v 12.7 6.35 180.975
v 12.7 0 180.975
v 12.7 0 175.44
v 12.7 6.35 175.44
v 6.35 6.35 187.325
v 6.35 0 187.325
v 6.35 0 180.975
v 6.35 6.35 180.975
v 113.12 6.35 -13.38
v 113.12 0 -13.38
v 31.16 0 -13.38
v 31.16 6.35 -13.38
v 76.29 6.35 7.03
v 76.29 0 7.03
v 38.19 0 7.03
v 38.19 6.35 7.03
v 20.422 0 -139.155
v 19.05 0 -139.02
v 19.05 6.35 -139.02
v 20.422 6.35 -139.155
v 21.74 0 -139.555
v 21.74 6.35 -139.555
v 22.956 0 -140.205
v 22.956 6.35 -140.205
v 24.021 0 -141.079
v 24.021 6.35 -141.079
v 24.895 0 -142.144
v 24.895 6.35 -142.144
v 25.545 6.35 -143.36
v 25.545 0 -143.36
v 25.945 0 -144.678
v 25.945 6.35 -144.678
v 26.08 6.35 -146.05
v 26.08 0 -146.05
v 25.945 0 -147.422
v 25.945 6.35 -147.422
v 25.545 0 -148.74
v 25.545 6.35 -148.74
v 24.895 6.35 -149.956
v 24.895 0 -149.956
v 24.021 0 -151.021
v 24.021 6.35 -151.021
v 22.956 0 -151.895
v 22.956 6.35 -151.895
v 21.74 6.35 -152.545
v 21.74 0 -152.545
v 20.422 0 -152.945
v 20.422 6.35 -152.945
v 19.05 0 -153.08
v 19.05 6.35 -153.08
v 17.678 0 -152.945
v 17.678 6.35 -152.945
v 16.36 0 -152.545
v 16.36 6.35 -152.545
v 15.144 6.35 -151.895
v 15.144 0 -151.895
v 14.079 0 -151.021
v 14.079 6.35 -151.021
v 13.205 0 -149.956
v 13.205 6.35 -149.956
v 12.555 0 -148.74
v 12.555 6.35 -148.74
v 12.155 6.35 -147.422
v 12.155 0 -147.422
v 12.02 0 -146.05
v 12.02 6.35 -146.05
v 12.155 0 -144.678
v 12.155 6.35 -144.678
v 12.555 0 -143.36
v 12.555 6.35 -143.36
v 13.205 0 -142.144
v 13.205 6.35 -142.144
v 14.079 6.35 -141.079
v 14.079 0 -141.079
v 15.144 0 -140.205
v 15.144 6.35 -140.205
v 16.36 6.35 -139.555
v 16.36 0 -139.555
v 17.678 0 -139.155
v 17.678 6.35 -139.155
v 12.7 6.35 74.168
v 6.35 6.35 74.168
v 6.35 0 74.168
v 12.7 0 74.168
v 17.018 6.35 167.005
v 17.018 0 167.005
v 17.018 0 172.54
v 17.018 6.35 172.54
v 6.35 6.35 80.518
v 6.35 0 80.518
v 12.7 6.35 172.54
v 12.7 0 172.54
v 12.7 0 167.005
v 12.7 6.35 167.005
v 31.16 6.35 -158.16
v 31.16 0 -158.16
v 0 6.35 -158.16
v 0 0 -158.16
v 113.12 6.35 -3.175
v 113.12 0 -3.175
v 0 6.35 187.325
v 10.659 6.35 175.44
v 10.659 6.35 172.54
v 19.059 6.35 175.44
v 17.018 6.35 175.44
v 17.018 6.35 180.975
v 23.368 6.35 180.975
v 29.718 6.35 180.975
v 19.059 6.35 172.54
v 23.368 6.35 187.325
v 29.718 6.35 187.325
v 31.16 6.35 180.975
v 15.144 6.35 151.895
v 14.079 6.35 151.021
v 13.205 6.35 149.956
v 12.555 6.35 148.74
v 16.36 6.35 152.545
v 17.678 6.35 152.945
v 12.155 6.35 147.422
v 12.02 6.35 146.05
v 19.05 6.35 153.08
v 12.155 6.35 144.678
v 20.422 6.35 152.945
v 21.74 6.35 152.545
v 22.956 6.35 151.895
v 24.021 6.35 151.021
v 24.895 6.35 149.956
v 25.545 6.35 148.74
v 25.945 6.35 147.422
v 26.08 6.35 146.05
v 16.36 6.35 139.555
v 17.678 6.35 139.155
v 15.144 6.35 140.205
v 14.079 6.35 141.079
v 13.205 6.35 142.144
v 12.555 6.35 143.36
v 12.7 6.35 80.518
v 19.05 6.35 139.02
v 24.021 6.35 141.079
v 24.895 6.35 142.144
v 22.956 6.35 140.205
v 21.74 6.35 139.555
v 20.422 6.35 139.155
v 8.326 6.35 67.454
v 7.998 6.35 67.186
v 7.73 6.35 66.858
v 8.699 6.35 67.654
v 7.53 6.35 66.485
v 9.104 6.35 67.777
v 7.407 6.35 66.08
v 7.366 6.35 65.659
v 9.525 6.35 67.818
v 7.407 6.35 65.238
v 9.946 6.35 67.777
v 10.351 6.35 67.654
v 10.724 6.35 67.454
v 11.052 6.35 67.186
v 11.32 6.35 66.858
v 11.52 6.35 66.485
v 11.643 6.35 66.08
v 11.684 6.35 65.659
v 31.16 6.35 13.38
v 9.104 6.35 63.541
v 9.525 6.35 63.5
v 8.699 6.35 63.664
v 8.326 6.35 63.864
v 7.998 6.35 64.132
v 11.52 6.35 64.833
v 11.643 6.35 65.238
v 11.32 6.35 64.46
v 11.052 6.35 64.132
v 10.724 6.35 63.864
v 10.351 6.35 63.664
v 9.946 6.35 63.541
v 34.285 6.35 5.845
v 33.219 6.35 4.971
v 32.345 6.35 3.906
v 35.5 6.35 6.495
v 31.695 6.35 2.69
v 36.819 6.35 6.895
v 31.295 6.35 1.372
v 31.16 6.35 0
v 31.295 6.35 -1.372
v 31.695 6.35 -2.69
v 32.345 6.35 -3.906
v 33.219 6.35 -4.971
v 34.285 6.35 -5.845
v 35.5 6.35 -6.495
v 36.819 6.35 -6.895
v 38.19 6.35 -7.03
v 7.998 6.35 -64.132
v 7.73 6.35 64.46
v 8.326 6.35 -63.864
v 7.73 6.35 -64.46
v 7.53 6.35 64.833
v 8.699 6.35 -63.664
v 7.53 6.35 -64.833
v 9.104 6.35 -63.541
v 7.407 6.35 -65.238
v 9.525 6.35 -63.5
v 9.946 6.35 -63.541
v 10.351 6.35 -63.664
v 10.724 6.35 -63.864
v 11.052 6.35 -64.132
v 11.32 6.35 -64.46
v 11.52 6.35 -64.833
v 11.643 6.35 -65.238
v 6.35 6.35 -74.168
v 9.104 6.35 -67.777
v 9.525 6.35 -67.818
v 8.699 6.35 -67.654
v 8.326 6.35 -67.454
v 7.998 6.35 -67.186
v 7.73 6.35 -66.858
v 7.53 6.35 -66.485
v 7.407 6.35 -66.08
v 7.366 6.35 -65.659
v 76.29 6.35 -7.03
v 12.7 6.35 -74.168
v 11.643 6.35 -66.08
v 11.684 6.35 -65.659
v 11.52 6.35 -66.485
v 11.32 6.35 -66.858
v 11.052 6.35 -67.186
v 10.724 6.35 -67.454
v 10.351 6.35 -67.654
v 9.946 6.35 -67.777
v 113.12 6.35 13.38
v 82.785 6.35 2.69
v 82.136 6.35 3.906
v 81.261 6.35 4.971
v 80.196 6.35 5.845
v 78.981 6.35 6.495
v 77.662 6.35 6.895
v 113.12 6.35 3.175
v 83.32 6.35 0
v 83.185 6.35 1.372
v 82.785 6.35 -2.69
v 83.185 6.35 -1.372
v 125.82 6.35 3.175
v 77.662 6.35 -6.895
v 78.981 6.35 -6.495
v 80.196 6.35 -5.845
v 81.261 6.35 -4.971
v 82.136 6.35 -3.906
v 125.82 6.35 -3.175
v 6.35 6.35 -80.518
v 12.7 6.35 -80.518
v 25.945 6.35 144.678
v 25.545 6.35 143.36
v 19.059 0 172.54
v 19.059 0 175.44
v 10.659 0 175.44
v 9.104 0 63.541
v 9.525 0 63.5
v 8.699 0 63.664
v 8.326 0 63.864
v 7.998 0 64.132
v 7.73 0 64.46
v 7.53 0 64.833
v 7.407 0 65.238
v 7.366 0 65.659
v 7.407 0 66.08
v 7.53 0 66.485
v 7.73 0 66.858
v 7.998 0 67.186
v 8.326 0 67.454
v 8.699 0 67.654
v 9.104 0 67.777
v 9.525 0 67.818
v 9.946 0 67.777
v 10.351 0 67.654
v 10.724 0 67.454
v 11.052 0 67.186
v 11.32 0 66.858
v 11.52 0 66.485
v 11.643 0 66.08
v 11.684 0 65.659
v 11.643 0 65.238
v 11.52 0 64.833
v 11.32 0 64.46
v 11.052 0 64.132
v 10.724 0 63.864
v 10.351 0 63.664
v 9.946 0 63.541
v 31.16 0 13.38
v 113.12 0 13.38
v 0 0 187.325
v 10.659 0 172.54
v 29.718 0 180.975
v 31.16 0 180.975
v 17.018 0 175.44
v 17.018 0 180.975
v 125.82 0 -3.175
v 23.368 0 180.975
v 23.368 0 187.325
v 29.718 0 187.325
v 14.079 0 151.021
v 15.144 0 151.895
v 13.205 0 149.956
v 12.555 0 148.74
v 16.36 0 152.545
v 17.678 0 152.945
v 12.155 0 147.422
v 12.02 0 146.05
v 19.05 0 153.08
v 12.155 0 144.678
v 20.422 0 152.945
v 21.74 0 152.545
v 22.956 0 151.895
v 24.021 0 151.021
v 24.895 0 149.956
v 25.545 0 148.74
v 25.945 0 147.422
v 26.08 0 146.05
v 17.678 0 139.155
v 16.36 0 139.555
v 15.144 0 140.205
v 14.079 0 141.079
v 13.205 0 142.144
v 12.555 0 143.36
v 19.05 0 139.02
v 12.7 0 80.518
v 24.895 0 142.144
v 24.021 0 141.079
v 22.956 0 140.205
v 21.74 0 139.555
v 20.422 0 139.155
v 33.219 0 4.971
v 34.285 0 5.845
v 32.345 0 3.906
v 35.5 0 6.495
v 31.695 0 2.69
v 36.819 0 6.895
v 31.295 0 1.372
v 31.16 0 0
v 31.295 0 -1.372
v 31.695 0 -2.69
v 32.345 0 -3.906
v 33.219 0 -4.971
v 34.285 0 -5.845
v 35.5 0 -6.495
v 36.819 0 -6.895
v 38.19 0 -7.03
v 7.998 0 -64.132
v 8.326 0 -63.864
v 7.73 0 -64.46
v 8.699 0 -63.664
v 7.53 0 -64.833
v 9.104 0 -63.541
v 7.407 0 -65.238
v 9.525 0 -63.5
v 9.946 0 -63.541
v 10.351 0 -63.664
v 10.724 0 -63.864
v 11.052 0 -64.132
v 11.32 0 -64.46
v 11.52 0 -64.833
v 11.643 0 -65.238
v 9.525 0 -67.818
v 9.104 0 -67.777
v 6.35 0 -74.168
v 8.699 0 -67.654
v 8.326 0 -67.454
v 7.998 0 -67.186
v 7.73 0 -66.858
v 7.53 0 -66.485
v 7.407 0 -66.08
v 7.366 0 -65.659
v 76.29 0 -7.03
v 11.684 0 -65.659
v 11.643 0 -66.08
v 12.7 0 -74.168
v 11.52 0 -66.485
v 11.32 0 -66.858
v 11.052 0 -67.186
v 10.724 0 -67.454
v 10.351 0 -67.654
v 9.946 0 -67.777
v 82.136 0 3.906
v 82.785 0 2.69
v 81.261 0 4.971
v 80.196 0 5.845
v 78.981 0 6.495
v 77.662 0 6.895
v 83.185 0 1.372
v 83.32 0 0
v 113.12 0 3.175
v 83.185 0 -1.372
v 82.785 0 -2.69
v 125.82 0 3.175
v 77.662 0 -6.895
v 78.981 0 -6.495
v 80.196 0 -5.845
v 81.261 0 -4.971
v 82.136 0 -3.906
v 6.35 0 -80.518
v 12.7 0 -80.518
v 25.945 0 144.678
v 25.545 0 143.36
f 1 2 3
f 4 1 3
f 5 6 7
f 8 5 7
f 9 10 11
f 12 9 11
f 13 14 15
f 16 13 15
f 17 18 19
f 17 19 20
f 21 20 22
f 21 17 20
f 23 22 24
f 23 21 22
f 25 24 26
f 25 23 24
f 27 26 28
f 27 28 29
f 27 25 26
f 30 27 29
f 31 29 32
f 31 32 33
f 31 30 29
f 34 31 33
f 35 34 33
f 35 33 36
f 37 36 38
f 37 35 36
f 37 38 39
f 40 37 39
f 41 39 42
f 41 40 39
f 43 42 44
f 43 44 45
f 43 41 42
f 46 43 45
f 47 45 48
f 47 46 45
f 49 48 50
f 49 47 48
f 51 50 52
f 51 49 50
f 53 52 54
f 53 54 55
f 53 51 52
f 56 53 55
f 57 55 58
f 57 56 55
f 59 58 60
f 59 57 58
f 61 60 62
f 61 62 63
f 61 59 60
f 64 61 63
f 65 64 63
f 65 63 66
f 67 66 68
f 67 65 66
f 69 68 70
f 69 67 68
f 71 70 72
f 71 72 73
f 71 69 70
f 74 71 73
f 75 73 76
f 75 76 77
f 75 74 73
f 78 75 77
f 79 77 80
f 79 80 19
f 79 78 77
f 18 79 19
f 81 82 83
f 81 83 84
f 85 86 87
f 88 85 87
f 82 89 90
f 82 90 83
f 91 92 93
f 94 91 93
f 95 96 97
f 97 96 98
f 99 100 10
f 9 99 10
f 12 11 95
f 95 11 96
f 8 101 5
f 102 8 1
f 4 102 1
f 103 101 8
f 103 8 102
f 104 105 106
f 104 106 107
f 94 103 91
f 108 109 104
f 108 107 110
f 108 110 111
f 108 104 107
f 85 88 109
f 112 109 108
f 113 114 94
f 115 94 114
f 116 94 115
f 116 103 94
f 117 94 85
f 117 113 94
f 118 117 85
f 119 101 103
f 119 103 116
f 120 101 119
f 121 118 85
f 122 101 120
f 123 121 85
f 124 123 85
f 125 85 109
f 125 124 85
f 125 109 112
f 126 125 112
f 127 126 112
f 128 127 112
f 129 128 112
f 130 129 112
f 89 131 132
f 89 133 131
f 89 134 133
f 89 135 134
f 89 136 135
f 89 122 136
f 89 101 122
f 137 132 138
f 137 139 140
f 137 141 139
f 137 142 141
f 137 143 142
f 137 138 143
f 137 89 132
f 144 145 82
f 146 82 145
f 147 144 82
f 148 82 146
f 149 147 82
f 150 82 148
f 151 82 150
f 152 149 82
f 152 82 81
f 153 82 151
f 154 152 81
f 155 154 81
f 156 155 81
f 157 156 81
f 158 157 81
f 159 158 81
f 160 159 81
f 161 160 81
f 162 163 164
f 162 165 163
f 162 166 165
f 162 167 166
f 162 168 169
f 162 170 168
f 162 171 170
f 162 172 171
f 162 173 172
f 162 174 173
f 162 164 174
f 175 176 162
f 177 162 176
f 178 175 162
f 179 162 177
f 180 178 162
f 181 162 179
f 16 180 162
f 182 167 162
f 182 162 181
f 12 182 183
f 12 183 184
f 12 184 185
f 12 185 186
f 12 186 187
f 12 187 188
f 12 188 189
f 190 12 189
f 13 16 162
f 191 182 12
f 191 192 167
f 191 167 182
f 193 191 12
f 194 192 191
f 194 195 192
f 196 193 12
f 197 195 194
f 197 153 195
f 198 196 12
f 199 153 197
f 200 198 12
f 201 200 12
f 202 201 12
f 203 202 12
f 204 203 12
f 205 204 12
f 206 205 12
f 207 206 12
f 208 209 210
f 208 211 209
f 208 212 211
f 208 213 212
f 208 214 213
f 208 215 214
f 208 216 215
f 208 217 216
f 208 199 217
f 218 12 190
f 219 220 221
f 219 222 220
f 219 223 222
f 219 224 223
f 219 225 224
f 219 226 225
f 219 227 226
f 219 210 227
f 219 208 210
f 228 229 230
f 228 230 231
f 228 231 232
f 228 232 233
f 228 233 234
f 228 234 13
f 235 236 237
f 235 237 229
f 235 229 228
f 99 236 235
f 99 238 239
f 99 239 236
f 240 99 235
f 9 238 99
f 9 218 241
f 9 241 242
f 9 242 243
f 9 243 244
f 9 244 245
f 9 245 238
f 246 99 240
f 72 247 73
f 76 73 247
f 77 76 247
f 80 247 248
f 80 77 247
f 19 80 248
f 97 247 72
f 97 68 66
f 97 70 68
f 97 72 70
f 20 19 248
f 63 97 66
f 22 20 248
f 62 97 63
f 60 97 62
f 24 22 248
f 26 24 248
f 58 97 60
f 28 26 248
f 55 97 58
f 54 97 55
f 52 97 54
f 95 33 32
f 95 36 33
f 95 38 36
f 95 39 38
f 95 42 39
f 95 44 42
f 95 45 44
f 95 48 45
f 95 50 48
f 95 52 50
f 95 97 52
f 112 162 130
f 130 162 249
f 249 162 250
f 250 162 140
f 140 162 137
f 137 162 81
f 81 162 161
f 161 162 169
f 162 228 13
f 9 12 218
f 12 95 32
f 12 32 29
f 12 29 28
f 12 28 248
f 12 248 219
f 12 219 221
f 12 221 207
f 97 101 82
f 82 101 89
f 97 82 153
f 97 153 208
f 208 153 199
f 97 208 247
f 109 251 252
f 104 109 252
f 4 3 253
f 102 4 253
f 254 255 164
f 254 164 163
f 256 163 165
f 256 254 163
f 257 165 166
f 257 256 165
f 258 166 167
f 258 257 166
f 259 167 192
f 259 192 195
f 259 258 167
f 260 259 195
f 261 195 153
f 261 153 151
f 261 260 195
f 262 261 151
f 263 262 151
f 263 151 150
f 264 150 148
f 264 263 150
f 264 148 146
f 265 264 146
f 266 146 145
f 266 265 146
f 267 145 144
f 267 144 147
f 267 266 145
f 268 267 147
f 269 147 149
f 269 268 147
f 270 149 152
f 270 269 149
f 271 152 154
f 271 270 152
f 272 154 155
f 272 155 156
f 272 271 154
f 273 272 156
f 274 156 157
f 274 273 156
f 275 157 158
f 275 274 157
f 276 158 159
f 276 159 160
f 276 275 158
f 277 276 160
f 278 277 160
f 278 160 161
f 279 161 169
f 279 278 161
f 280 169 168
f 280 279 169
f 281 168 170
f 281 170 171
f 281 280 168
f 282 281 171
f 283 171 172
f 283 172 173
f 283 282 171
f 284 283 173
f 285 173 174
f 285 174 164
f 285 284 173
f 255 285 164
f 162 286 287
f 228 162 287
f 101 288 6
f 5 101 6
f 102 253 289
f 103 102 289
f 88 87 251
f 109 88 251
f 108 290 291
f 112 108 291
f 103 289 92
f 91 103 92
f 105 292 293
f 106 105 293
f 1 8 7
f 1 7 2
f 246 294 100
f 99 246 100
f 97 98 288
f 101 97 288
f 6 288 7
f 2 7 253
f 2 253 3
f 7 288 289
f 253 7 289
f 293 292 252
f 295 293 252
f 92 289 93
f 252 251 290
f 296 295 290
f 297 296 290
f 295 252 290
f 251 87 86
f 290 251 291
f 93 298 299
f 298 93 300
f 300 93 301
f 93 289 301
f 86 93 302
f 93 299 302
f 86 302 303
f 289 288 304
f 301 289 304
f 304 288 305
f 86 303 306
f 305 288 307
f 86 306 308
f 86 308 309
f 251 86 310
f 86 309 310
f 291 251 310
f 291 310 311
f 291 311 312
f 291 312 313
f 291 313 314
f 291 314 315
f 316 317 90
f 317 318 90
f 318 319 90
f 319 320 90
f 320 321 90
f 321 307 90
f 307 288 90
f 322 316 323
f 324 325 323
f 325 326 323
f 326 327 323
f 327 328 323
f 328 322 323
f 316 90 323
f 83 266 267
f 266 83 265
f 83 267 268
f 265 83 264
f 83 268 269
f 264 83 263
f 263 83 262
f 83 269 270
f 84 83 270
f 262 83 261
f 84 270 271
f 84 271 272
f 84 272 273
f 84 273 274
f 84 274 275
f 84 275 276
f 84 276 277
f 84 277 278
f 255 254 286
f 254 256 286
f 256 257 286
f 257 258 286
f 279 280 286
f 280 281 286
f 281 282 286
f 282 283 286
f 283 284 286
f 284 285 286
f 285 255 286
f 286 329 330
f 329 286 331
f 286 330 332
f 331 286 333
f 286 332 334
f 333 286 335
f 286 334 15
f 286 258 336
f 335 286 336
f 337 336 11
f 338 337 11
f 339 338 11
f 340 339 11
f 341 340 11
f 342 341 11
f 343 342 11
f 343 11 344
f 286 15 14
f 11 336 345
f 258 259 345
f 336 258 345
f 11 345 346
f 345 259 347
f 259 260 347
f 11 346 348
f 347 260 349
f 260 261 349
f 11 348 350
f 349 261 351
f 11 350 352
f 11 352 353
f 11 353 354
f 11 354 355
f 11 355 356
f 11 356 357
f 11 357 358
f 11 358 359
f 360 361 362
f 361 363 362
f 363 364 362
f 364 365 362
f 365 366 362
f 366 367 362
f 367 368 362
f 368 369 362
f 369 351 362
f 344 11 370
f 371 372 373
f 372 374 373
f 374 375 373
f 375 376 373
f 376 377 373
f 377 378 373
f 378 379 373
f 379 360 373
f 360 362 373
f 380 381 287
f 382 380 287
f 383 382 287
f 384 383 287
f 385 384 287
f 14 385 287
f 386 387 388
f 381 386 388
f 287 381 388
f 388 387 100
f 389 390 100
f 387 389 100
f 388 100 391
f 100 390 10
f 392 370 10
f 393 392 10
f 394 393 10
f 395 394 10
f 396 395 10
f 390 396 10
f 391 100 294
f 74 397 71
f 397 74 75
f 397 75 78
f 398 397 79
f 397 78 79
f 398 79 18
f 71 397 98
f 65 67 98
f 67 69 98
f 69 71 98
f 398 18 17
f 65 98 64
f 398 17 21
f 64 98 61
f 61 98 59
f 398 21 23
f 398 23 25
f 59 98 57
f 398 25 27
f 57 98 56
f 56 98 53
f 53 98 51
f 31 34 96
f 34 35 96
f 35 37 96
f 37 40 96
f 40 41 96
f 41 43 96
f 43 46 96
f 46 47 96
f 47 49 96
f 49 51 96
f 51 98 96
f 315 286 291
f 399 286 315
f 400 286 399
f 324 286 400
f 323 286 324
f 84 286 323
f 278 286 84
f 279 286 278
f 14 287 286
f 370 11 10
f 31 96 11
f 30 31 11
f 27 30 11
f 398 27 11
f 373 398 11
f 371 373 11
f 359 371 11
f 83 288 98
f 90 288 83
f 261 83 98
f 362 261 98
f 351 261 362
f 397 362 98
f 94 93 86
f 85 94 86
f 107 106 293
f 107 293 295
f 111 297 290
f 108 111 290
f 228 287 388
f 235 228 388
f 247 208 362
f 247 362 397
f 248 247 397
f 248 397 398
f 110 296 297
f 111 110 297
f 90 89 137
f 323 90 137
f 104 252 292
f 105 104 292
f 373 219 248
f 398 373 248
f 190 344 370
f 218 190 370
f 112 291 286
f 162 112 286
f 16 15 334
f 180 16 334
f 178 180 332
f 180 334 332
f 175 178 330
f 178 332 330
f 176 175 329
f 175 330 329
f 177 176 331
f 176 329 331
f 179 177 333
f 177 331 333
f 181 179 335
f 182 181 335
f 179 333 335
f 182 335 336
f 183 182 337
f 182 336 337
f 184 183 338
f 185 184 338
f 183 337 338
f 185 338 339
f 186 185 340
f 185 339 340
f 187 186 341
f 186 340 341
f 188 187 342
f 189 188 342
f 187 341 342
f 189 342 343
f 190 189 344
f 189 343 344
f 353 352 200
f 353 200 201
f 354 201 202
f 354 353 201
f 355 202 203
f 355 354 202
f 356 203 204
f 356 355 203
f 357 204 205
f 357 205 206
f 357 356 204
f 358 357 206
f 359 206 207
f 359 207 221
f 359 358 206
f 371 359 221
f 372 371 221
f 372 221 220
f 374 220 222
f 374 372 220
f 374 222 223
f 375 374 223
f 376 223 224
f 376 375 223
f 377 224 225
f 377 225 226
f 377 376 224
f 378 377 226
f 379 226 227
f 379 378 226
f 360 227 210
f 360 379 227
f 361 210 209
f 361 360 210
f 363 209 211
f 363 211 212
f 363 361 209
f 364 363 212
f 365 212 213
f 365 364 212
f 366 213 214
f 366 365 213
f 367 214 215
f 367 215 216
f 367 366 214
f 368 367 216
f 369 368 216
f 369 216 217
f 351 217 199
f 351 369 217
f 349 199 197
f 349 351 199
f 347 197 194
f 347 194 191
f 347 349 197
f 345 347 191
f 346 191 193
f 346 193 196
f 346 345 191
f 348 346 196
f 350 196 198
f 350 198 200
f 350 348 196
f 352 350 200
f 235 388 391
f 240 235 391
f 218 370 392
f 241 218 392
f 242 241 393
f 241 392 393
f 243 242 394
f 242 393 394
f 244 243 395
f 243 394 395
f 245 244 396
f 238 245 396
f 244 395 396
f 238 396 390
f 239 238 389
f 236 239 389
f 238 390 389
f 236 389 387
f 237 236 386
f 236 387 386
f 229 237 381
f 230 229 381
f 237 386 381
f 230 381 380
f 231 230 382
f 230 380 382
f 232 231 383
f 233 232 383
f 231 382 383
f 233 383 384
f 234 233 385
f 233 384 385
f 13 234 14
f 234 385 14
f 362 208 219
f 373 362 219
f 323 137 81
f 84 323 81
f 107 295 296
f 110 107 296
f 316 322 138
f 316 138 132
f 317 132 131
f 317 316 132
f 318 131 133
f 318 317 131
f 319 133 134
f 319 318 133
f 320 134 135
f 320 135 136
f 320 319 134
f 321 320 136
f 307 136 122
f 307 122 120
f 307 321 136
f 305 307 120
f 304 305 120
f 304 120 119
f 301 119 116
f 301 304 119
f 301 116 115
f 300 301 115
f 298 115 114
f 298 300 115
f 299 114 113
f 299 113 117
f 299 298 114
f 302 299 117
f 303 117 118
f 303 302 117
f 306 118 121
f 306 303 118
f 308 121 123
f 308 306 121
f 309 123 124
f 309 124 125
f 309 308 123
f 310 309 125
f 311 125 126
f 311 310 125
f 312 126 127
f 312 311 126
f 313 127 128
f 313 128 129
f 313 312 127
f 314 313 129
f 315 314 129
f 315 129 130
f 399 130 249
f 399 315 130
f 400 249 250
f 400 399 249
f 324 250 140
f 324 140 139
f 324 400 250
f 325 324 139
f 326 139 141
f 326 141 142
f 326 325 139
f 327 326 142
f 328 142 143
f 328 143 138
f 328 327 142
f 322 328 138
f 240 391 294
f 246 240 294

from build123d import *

# Parameters (mm, degrees)
AXLE_SUPPORT_PLATE_R   = 7.030128061
AXLE_SUPPORT_PLATE_R_2 = 2.159
AXLE_SUPPORT_PLATE_W   = 6.35
AXLE_SUPPORT_PLATE_H   = 6.35
BOSS_EXTRUDE1_DEPTH    = 6.35


with BuildPart() as part:
    # Axle Support Plate → Boss-Extrude1 (new body)
    with BuildSketch(Plane(origin=(0, 0, 0), x_dir=(1, 0, 0), z_dir=(0, 1, 0))):
        Polygon((31.160128061, -180.975), (31.160128061, -13.380128061), (113.120256121, -13.380128061), (113.120256121, -3.175), (125.820256121, -3.175), (125.820256121, 3.175), (113.120256121, 3.175), (113.120256121, 13.380128061), (31.160128061, 13.380128061), (31.160128061, 158.160128061), (0, 158.160128061), (0, -187.325), (6.35, -187.325), (6.35, -180.975), (12.7, -180.975), (12.7, -175.440000021), (10.659000018, -175.440000021), (10.659000018, -172.539999979), (12.7, -172.539999979), (12.7, -167.005), (17.018, -167.005), (17.018, -172.539999979), (19.058999982, -172.539999979), (19.058999982, -175.440000021), (17.018, -175.440000021), (17.018, -180.975), (23.368, -180.975), (23.368, -187.325), (29.718, -187.325), (29.718, -180.975), align=None)
        with Locations(Location((19.05, 146.05, 0), (0, 0, 270))):
            Circle(AXLE_SUPPORT_PLATE_R, mode=Mode.SUBTRACT)
        with Locations(Location((19.05, -146.05, 0), (0, 0, 90))):
            Circle(AXLE_SUPPORT_PLATE_R, mode=Mode.SUBTRACT)
        with Locations(Location((9.525, 65.659, 0), (0, 0, 270))):
            Circle(AXLE_SUPPORT_PLATE_R_2, mode=Mode.SUBTRACT)
        with Locations(Location((9.525, -65.659, 0), (0, 0, 90))):
            Circle(AXLE_SUPPORT_PLATE_R_2, mode=Mode.SUBTRACT)
        with Locations((9.525, -77.343)):
            Rectangle(AXLE_SUPPORT_PLATE_W, AXLE_SUPPORT_PLATE_H, mode=Mode.SUBTRACT)
        with Locations((9.525, 77.343)):
            Rectangle(AXLE_SUPPORT_PLATE_W, AXLE_SUPPORT_PLATE_H, mode=Mode.SUBTRACT)
        with BuildLine():
            Line((38.190256121, 7.030128061), (76.290256121, 7.030128061))
            ThreePointArc((76.290256121, 7.030128061), (83.320384182, 0), (76.290256121, -7.030128061))
            Line((76.290256121, -7.030128061), (38.190256121, -7.030128061))
            ThreePointArc((38.190256121, -7.030128061), (31.160128061, 0), (38.190256121, 7.030128061))
        make_face(mode=Mode.SUBTRACT)
    extrude(amount=BOSS_EXTRUDE1_DEPTH)


solid = part.part
